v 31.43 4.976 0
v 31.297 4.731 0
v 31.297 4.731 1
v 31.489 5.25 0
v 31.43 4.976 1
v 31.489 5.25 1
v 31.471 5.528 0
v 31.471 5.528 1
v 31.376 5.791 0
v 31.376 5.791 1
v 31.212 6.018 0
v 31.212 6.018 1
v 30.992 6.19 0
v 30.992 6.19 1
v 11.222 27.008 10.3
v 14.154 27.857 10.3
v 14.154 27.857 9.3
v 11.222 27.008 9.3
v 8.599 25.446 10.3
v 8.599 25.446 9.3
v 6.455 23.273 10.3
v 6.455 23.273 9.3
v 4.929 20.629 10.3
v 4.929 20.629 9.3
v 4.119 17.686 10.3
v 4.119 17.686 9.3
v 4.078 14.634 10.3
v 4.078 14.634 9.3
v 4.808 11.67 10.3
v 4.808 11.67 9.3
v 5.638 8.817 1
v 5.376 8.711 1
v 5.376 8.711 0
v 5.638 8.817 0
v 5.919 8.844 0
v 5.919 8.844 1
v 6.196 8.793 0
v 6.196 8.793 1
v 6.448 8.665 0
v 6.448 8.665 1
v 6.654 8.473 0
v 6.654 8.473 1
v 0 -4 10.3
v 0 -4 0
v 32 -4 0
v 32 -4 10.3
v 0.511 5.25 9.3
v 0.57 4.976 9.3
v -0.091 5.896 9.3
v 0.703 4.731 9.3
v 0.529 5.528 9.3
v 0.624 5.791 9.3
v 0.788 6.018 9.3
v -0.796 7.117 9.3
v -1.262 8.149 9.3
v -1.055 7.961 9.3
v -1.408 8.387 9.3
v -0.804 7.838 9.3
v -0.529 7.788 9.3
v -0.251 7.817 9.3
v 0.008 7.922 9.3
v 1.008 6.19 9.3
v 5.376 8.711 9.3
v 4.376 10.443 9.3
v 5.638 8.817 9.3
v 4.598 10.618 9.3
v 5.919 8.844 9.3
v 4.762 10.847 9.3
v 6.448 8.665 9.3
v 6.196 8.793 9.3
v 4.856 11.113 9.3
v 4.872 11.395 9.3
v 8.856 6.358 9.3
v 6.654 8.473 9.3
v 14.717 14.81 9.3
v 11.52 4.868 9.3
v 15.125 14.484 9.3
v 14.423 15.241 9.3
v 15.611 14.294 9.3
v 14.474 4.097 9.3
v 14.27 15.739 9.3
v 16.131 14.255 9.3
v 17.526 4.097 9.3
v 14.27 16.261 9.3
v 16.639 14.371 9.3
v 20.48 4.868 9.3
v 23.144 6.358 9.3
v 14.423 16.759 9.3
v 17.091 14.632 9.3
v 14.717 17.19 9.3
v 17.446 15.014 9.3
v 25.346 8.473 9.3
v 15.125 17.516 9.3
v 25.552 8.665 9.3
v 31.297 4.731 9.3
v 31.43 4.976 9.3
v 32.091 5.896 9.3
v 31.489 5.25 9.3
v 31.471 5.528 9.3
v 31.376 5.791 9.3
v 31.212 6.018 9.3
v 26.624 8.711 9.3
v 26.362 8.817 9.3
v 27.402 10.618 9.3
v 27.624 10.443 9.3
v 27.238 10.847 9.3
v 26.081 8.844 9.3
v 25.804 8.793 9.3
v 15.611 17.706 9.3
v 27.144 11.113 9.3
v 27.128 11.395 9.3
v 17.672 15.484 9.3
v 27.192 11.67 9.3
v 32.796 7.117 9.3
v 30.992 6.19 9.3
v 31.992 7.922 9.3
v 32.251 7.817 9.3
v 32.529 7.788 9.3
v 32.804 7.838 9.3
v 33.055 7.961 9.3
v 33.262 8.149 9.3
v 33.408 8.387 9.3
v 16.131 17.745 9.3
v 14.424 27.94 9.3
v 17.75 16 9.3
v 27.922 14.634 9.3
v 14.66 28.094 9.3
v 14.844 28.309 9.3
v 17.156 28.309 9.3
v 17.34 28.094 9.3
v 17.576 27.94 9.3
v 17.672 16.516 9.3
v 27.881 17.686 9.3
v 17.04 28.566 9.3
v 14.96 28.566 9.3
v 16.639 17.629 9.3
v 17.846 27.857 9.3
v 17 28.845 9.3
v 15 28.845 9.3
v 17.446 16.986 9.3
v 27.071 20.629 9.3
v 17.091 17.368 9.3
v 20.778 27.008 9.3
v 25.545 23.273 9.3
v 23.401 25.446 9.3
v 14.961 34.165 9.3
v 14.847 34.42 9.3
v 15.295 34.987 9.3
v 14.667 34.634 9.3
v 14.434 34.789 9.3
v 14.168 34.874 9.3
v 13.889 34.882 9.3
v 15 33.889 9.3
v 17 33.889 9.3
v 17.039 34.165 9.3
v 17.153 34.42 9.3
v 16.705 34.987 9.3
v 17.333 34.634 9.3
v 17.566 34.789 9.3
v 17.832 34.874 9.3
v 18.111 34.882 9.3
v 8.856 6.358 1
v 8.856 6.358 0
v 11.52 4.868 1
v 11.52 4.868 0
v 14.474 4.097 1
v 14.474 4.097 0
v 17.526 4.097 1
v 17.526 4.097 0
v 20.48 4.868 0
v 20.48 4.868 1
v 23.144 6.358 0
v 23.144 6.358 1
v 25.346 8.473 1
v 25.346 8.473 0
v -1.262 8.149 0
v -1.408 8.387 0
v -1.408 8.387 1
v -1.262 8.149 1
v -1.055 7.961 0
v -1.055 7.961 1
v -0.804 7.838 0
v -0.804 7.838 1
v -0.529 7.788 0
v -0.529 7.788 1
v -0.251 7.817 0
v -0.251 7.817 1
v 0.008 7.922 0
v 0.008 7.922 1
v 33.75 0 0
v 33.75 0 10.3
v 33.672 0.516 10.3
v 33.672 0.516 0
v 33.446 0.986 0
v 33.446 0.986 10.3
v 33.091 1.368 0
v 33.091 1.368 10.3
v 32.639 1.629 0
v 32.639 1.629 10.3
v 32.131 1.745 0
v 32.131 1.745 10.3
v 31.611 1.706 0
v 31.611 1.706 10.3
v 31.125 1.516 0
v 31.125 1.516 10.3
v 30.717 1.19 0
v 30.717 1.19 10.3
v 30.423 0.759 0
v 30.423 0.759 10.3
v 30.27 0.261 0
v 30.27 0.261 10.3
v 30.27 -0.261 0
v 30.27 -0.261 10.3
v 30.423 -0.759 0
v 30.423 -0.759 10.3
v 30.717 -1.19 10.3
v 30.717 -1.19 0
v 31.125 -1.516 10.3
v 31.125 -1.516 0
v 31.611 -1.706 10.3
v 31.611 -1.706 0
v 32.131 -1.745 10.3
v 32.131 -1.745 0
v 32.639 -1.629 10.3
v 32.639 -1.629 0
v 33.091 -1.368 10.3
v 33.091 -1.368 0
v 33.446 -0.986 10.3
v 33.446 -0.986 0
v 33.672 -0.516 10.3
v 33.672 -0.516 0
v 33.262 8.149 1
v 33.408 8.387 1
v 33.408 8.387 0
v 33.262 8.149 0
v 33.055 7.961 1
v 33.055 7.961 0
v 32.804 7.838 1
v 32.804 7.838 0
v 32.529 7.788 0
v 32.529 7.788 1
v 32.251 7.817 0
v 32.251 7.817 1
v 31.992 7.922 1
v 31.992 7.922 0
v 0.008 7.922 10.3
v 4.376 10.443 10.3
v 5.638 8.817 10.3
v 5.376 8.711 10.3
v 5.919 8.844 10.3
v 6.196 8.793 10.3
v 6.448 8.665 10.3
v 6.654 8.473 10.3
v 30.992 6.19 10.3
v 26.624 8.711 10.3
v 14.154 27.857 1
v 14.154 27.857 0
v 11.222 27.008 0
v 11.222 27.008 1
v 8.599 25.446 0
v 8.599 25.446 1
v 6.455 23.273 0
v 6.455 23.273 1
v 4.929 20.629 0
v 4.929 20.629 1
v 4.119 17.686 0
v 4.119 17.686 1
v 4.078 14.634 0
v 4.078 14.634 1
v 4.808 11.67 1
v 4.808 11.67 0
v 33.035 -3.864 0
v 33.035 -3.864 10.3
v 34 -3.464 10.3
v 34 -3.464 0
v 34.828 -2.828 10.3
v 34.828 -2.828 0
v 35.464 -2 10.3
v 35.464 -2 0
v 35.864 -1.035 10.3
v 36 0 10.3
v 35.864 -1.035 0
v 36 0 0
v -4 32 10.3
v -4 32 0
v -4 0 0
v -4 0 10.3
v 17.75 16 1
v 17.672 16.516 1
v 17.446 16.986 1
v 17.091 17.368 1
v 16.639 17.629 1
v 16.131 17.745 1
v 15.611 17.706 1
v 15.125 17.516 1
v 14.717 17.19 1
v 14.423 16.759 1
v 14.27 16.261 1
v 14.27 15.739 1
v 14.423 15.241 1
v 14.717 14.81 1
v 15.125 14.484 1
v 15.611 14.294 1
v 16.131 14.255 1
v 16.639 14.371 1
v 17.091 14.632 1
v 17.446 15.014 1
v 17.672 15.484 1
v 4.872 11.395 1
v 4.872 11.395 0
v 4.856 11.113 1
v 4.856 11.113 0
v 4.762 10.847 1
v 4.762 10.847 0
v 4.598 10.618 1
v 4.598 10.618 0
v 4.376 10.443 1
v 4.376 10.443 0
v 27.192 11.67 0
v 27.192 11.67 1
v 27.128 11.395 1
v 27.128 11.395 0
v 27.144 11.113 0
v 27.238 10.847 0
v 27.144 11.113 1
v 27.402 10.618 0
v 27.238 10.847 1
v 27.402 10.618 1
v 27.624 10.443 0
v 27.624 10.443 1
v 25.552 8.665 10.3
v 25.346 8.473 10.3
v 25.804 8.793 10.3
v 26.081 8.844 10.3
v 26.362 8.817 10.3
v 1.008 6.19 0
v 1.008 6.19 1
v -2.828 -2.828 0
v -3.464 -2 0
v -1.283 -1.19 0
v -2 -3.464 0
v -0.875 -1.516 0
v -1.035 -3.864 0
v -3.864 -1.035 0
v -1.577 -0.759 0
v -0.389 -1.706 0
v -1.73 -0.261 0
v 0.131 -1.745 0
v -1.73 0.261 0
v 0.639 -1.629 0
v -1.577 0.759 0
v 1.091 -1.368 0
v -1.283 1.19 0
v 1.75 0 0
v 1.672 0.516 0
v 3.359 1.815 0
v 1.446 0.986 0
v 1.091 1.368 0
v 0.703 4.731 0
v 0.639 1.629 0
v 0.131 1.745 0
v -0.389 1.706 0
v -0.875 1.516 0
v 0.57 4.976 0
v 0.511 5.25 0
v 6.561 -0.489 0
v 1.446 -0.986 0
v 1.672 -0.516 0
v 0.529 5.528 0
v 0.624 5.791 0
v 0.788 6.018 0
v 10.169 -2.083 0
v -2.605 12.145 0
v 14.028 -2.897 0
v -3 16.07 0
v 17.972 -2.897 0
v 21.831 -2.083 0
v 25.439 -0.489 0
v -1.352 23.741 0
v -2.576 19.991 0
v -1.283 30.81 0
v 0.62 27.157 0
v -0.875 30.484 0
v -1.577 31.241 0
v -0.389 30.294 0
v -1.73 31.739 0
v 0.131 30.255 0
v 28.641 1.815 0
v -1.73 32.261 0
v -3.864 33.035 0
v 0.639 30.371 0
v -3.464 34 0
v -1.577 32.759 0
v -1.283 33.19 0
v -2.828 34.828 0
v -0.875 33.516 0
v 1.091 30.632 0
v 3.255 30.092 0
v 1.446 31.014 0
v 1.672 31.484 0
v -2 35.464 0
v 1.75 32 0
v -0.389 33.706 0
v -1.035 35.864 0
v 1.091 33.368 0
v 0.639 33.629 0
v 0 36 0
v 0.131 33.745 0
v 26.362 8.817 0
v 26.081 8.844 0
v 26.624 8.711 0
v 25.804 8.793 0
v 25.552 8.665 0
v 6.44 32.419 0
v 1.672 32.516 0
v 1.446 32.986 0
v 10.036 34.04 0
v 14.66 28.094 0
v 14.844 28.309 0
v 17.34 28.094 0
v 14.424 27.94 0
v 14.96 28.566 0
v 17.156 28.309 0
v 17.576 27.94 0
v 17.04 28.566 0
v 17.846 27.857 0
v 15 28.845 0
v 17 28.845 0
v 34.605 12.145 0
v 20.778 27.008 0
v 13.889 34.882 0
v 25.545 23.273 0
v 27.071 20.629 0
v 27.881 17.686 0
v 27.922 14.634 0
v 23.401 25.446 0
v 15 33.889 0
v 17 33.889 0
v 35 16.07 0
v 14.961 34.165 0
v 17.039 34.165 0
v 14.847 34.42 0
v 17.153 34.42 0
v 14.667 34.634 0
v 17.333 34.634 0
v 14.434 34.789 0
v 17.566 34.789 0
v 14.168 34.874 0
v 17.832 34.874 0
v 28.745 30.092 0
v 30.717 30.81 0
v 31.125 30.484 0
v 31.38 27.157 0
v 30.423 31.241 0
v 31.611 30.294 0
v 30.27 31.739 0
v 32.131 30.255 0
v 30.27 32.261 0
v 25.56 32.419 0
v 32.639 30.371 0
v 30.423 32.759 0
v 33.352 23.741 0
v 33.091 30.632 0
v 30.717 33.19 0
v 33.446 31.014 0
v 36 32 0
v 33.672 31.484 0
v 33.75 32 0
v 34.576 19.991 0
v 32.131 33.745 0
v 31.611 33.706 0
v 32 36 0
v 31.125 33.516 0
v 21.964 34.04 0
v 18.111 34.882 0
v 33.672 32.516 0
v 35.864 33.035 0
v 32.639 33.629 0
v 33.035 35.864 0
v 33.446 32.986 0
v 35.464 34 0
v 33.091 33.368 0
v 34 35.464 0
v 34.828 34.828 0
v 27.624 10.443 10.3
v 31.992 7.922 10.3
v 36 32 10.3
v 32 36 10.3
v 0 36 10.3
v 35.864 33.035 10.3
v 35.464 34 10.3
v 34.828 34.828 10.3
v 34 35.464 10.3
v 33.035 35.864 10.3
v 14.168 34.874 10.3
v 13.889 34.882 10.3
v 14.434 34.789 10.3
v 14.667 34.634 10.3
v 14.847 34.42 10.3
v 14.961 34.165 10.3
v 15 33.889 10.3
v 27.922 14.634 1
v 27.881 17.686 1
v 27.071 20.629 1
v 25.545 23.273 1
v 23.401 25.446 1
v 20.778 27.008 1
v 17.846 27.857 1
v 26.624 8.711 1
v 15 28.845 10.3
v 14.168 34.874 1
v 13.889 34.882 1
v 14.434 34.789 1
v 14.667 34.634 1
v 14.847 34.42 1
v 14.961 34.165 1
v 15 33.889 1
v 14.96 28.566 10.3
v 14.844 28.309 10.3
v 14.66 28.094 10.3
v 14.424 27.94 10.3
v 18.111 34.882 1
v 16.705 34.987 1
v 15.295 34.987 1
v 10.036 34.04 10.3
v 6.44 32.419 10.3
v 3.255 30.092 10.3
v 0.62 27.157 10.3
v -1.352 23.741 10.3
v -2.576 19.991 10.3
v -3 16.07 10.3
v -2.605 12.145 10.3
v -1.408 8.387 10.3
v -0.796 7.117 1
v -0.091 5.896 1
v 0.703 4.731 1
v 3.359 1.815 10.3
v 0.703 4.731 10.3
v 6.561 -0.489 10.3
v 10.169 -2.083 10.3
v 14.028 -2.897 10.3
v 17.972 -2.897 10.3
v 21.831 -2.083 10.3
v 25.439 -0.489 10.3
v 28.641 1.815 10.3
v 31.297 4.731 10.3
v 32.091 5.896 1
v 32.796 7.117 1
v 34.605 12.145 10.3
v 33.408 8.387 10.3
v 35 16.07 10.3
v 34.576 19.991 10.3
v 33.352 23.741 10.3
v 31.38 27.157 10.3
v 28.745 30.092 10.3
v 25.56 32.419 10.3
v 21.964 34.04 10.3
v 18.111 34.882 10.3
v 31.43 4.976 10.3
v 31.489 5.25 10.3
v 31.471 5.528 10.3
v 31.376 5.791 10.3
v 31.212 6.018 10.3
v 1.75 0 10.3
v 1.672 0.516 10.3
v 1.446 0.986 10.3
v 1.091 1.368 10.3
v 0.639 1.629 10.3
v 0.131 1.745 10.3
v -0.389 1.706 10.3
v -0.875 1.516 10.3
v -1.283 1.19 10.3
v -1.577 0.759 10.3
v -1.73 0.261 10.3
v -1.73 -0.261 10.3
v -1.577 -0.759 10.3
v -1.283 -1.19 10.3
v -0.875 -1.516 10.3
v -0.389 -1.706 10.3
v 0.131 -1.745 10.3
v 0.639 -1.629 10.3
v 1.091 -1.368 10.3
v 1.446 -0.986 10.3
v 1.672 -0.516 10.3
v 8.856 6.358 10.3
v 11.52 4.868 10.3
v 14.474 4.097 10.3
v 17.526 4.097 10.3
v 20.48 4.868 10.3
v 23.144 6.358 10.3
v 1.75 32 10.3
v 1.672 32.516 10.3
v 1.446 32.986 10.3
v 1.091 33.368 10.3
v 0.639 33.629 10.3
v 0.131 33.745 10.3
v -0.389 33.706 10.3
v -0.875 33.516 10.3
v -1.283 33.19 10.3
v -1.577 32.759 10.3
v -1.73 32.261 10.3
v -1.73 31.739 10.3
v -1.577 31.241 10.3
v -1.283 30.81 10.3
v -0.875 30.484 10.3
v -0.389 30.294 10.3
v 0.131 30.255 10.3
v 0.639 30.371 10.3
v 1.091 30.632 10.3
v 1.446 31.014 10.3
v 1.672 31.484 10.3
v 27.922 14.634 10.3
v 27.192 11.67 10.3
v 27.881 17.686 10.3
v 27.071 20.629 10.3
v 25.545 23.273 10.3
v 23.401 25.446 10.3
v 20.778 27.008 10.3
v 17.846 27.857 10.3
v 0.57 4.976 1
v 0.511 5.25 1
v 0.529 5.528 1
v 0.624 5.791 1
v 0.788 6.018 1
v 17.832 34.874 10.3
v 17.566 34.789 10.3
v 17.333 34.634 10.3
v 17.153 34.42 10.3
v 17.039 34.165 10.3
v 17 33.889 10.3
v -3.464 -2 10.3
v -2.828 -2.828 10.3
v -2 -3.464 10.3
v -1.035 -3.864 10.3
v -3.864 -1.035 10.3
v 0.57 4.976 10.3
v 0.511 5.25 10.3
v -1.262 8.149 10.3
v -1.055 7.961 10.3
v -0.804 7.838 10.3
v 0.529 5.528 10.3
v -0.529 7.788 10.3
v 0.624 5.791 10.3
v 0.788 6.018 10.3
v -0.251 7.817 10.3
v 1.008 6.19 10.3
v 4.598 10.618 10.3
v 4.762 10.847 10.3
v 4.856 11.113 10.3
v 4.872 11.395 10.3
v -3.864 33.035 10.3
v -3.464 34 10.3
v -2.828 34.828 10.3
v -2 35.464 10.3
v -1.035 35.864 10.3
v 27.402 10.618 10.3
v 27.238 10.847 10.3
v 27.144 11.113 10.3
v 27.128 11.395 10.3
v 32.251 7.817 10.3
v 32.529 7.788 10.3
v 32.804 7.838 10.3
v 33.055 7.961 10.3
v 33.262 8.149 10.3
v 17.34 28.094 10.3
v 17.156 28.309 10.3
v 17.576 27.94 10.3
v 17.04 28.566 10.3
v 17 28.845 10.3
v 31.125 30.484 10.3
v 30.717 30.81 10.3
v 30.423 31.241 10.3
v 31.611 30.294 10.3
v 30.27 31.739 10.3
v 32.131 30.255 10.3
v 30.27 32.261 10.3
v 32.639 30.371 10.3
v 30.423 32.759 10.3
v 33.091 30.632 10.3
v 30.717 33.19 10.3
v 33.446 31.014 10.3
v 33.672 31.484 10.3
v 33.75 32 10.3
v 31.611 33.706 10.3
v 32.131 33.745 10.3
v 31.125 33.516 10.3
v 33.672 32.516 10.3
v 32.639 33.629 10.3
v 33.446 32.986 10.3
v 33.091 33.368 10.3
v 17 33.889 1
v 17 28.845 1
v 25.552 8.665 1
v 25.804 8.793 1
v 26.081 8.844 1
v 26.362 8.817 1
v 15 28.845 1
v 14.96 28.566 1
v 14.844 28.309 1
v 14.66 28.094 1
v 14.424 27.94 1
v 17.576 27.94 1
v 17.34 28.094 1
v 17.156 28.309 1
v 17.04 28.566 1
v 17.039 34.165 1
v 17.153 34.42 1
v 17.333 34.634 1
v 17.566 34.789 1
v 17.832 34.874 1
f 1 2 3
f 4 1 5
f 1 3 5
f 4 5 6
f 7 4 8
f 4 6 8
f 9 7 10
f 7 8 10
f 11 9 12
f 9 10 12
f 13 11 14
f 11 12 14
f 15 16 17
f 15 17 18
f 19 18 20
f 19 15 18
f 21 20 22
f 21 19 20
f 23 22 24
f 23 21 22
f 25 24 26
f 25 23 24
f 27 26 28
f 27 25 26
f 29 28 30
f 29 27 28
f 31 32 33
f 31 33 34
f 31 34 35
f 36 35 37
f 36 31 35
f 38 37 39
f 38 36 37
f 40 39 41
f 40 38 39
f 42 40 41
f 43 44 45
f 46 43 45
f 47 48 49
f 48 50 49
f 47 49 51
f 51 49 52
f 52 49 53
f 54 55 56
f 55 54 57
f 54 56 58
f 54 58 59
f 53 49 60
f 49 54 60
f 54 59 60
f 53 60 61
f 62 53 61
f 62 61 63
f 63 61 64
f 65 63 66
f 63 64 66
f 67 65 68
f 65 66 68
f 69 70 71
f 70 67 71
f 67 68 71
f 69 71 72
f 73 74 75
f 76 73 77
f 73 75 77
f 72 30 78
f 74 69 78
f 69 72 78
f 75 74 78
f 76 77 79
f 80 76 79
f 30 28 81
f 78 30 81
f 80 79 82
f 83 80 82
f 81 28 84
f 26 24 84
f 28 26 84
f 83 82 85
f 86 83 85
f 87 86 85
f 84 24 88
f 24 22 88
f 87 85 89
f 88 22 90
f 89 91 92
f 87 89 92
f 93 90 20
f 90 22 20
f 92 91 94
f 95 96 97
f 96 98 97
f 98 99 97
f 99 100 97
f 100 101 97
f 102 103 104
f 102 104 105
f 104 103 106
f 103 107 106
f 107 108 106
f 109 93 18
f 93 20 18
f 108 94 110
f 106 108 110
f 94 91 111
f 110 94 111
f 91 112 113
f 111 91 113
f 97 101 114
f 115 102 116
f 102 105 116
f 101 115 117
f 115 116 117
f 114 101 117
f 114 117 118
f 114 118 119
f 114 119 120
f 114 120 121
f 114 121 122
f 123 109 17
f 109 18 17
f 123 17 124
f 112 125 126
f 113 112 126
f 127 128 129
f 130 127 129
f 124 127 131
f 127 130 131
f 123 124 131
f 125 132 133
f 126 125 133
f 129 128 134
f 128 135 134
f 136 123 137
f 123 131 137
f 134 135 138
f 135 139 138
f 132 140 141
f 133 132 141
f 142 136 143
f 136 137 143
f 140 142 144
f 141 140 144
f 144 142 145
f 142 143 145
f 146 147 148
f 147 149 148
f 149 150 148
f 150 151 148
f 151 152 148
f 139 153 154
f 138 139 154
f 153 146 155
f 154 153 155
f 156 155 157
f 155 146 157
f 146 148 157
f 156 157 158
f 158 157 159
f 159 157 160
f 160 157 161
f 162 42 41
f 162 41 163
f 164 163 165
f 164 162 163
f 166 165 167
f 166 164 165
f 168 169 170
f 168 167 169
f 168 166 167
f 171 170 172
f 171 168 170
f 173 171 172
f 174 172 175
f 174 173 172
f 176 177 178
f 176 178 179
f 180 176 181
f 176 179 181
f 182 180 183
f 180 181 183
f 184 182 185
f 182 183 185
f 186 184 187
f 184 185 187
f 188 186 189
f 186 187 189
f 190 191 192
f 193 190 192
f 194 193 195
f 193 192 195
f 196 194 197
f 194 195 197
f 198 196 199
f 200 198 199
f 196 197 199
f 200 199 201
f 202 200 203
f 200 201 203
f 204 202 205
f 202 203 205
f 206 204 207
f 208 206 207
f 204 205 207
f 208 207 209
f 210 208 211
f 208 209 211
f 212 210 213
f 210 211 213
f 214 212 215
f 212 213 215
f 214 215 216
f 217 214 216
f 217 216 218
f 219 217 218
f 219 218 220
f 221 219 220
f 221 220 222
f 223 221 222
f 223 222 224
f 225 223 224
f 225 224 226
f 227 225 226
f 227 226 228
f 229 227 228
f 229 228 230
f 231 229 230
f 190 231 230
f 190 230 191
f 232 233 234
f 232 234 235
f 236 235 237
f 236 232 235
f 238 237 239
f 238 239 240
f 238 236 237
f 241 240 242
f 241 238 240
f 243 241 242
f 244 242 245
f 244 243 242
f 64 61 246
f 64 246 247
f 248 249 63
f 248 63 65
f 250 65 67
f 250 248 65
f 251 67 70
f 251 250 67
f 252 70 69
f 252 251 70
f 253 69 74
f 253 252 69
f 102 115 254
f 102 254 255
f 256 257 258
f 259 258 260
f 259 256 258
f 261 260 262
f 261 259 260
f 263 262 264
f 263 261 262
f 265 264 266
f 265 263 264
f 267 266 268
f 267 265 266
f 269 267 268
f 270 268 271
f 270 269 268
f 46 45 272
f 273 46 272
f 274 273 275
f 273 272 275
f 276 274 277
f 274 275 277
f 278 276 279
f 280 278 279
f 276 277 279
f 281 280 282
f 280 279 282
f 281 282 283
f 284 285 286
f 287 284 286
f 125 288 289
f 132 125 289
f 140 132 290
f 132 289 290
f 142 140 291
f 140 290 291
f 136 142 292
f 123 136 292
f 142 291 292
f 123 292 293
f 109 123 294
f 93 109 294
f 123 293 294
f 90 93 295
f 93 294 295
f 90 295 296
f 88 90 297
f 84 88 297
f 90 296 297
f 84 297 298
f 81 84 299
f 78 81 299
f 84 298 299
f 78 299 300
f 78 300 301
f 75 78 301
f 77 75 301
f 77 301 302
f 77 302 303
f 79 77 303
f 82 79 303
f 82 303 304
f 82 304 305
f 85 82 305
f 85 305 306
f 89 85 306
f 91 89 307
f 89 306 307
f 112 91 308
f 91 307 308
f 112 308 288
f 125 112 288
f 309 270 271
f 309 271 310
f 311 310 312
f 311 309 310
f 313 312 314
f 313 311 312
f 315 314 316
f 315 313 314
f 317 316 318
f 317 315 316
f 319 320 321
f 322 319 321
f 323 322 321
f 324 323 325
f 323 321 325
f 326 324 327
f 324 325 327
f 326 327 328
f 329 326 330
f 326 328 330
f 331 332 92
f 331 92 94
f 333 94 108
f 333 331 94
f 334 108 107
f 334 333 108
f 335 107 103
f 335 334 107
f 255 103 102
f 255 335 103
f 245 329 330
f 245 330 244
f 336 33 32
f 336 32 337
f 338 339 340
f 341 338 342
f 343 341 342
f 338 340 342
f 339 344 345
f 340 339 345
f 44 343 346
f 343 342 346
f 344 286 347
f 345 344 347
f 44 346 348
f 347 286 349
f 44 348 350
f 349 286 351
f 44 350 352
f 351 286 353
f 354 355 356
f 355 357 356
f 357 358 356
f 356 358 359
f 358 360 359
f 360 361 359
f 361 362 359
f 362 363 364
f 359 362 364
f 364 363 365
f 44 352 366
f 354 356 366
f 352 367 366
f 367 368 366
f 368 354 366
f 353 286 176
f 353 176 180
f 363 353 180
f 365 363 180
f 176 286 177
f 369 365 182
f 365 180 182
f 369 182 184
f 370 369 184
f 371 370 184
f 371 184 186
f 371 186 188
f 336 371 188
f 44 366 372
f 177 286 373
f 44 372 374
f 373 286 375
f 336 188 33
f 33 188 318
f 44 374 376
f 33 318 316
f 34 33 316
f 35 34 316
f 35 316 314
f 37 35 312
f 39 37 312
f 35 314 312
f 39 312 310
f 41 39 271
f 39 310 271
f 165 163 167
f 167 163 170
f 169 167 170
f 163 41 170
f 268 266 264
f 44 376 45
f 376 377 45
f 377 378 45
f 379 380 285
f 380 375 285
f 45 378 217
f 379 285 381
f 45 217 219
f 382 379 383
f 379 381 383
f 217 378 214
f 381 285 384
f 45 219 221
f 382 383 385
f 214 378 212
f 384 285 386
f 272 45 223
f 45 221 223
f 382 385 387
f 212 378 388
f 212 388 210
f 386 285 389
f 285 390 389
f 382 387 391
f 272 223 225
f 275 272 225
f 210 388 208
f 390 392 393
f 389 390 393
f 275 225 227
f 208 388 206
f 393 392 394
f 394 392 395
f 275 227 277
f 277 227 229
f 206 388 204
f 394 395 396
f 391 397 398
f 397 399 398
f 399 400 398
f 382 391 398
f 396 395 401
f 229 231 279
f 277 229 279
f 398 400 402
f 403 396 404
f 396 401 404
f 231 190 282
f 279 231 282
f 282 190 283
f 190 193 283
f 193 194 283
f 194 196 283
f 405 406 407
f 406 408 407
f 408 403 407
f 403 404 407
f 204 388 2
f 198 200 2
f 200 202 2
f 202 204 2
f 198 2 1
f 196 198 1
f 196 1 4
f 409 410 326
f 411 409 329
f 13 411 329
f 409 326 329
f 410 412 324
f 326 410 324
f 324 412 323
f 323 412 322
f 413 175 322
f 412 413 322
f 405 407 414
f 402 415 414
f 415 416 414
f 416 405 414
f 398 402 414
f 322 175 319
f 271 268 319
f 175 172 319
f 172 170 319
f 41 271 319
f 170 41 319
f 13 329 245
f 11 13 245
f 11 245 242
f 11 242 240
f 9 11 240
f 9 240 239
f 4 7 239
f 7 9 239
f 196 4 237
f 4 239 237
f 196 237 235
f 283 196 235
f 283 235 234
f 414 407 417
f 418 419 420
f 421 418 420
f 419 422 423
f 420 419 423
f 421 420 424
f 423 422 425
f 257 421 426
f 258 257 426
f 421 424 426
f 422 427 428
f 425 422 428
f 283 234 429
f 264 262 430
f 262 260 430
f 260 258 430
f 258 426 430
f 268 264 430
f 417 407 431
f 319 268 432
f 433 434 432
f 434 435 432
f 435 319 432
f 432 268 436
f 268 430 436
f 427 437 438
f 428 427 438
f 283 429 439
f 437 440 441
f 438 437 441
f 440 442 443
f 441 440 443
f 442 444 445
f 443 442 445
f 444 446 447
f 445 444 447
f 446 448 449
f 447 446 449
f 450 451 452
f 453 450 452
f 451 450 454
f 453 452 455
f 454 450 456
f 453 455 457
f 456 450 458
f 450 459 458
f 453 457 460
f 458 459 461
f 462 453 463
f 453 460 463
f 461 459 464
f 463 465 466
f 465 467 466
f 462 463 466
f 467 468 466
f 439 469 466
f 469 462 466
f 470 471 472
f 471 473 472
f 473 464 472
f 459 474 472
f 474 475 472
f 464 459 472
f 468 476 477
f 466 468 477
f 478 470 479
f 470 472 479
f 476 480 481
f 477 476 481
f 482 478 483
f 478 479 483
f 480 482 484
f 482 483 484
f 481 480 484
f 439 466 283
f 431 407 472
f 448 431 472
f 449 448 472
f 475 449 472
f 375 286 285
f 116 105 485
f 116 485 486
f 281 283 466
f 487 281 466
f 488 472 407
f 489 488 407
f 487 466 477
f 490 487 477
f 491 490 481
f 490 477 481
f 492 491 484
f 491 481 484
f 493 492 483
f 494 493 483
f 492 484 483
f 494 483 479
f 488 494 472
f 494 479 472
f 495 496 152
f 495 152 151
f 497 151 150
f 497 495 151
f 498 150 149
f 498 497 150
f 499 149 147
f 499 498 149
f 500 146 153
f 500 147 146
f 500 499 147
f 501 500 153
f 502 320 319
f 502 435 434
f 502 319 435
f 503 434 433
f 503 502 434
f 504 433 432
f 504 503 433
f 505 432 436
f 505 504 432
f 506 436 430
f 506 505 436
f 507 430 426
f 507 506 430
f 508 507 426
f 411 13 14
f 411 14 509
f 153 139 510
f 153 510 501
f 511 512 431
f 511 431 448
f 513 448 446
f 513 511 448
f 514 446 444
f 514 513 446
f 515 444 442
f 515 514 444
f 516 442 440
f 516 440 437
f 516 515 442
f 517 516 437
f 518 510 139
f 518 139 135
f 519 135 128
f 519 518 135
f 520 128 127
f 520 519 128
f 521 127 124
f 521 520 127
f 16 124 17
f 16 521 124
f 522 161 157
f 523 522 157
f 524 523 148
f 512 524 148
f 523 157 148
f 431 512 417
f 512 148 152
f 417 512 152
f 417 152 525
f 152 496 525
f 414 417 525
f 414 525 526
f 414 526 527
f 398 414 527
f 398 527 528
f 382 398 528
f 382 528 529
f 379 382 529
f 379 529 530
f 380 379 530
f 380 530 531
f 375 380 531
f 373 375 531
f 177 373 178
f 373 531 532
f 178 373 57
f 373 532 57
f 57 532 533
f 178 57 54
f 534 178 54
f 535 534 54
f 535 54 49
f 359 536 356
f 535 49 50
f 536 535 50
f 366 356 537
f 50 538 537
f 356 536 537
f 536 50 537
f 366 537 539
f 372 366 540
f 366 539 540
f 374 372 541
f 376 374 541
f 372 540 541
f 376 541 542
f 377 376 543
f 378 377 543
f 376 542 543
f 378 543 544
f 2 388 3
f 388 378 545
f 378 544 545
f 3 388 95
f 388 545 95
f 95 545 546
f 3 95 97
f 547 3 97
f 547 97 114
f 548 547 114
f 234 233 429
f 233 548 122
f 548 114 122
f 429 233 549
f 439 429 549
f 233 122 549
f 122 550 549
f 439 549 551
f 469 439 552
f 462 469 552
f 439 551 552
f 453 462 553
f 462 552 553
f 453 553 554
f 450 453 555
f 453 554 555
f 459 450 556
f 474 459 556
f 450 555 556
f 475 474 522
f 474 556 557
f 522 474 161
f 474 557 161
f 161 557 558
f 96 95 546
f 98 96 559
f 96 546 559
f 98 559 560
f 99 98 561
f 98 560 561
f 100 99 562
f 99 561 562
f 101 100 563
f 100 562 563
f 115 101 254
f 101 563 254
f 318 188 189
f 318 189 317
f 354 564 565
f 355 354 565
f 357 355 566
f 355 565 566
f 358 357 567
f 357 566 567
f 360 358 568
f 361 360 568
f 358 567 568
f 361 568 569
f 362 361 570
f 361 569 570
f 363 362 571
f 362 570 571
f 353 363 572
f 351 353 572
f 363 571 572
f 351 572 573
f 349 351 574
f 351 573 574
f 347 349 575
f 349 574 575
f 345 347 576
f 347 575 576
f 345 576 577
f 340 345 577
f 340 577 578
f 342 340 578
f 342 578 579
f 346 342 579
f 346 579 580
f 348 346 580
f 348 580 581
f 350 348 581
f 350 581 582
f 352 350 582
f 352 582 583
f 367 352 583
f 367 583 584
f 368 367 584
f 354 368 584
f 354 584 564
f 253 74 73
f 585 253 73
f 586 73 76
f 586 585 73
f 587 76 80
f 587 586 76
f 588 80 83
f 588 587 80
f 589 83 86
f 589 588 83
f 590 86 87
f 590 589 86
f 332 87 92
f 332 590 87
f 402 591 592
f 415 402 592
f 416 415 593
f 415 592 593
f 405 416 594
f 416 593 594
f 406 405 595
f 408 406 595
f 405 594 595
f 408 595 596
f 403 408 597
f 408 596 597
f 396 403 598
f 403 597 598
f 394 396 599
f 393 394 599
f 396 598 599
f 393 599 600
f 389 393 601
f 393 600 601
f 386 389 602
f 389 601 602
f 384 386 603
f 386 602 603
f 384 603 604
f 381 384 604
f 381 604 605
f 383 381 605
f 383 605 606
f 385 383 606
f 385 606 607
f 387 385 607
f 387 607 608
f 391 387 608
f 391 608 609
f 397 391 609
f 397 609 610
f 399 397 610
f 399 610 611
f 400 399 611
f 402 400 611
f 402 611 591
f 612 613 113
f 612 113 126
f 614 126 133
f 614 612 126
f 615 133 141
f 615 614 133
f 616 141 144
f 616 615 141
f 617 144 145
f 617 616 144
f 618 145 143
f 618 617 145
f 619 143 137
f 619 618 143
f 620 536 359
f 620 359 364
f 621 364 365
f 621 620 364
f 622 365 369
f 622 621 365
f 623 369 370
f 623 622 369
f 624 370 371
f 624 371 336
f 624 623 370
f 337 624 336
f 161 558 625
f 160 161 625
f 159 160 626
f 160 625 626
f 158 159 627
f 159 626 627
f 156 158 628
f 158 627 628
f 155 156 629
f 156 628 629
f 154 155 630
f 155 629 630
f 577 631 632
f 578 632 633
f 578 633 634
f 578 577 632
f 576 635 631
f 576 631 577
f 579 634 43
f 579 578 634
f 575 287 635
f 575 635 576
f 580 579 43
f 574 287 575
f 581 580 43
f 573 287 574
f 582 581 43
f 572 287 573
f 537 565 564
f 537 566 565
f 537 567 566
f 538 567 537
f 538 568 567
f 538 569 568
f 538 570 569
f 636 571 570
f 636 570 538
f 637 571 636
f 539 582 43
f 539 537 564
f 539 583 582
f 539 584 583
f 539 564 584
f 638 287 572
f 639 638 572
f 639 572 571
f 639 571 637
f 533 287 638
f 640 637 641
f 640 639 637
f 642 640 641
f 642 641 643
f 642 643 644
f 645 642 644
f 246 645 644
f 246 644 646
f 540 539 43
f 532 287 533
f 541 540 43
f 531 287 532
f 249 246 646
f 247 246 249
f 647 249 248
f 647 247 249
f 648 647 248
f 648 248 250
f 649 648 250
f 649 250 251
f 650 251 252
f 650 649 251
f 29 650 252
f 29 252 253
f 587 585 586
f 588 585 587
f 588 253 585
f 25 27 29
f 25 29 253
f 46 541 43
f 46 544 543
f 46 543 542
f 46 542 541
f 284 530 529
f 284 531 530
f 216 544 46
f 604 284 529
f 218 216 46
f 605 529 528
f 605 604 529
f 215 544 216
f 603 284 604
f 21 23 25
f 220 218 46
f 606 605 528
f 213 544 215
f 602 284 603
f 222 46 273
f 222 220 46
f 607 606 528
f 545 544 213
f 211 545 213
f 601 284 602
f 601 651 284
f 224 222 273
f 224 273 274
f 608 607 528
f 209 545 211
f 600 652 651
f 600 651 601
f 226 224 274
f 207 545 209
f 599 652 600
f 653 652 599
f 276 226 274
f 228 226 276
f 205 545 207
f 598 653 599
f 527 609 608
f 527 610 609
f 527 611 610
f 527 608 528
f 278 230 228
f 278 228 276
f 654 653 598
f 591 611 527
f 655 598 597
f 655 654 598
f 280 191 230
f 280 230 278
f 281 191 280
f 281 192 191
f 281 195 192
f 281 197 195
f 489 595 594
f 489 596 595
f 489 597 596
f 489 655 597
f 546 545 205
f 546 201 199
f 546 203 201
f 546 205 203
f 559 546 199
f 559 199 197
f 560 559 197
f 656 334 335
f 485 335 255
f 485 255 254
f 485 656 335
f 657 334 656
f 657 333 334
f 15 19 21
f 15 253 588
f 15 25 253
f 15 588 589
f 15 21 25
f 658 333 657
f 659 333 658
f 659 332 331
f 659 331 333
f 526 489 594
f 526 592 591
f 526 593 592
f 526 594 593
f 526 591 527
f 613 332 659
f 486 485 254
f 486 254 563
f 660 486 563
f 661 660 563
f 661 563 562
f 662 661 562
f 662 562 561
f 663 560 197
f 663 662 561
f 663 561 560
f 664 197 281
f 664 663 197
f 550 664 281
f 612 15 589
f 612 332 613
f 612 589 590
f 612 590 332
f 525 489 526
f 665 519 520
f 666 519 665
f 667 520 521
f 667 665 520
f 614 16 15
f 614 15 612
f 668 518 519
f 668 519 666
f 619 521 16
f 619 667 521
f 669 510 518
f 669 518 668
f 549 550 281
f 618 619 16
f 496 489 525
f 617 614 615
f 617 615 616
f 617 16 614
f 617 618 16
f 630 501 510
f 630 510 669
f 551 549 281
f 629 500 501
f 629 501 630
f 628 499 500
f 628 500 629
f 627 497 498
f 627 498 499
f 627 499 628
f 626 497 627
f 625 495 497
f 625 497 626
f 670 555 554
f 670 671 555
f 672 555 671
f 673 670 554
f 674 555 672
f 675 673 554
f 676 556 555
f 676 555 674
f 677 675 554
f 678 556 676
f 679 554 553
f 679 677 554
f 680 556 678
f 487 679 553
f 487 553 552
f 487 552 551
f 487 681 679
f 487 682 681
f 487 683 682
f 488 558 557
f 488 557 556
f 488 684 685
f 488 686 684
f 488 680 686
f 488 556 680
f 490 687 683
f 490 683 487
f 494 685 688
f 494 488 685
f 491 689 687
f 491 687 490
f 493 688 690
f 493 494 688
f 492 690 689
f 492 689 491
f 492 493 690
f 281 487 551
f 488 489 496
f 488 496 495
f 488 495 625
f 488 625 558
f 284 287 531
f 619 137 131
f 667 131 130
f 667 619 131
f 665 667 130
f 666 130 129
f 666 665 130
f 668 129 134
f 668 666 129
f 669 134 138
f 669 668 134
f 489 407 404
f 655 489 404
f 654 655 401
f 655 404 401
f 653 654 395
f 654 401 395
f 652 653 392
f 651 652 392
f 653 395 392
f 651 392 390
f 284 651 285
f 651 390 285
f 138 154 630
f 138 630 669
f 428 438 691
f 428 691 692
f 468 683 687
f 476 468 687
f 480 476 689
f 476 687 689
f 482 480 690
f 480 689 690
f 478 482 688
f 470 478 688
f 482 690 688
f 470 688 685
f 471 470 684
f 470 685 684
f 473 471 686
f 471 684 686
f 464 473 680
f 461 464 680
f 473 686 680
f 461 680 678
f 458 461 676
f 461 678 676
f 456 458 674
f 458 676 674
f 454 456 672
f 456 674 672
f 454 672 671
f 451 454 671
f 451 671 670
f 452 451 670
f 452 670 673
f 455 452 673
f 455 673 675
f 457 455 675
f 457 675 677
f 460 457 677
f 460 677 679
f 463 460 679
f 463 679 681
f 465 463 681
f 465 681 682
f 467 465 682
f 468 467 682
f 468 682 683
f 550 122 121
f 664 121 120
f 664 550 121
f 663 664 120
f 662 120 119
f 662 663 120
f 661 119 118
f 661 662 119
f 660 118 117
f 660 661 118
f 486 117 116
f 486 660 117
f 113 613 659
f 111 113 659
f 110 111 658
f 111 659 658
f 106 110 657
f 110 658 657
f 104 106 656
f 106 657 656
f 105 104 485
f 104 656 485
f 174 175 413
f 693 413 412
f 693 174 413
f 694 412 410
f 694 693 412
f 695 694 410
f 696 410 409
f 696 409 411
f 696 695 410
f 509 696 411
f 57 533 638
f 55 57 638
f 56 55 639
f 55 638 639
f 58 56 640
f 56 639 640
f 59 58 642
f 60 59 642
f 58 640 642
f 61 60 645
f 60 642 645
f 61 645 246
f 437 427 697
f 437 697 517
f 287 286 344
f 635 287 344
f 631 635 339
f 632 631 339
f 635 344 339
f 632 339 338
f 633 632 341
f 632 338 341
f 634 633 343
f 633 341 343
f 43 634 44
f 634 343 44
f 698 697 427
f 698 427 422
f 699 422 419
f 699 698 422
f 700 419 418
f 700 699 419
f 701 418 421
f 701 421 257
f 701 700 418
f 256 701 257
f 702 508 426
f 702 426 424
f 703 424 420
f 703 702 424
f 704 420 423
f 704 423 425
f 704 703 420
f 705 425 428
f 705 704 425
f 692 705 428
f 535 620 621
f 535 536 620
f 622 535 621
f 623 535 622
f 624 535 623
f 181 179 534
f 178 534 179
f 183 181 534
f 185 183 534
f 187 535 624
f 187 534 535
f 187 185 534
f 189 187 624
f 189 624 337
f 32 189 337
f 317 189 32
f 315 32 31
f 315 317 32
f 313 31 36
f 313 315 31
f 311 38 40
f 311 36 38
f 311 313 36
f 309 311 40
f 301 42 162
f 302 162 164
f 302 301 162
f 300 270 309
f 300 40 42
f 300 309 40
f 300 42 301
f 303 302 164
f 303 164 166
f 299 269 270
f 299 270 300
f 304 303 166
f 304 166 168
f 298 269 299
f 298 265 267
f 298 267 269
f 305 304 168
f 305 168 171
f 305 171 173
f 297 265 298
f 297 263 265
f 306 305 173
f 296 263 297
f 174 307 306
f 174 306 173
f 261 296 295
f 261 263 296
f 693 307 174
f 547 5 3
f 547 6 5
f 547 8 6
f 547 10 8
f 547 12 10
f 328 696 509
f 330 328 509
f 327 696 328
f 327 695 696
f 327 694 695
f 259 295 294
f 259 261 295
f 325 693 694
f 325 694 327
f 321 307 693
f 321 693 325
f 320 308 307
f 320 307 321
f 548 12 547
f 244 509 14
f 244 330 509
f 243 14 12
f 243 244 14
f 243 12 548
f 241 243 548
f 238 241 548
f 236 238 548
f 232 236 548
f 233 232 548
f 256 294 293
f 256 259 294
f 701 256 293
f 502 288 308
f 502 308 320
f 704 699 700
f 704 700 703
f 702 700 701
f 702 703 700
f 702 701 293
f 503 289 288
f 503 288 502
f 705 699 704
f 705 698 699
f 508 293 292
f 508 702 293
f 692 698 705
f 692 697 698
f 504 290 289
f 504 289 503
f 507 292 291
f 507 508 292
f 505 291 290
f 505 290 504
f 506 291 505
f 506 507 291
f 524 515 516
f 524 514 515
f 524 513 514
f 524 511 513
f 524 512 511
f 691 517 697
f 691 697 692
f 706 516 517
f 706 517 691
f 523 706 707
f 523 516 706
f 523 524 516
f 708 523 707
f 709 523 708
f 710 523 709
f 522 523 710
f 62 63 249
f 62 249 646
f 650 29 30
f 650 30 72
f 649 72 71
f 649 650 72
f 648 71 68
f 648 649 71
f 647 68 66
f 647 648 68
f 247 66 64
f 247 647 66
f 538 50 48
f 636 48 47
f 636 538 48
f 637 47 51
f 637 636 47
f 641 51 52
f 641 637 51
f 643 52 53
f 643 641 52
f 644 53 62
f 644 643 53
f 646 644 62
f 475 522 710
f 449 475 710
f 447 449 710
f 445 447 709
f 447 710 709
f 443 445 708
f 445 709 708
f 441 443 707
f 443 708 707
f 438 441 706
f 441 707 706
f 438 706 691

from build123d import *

# Parameters (mm, degrees)
BOSS_EXTRUDE1_DEPTH = 10.3
SKETCH2_R           = 1.75
CUT_EXTRUDE1_DEPTH  = 11.3
SKETCH3_R           = 19
SKETCH3_R_2         = 12
CUT_EXTRUDE2_DEPTH  = 11.3
BOSS_EXTRUDE2_DEPTH = 10.3
CIRPATTERN1_COUNT   = 3
FILLET2_R           = 1
CUT_EXTRUDE3_START  = 1
SKETCH5_R           = 19
CUT_EXTRUDE3_DEPTH  = 8.3
SKETCH6_R           = 1.75
BOSS_EXTRUDE3_DEPTH = 8.3


with BuildPart() as part:
    # Sketch1 → Boss-Extrude1 (new body)
    with BuildSketch(Plane.XY):
        with BuildLine():
            Line((0, -4), (32, -4))
            ThreePointArc((32, -4), (34.828427125, -2.828427125), (36, 0))
            Line((36, 0), (36, 32))
            ThreePointArc((36, 32), (34.828427125, 34.828427125), (32, 36))
            Line((32, 36), (0, 36))
            ThreePointArc((0, 36), (-2.828427125, 34.828427125), (-4, 32))
            Line((-4, 32), (-4, 0))
            ThreePointArc((-4, 0), (-2.828427125, -2.828427125), (0, -4))
        make_face()
    extrude(amount=BOSS_EXTRUDE1_DEPTH)

    # Sketch2 → Cut-Extrude1 (cut, through all)
    with BuildSketch(Plane.XY.offset(10.3)):
        Circle(SKETCH2_R)
        with Locations((0, 32)):
            Circle(SKETCH2_R)
        with Locations((32, 0)):
            Circle(SKETCH2_R)
        with Locations((32, 32)):
            Circle(SKETCH2_R)
    extrude(amount=-CUT_EXTRUDE1_DEPTH, mode=Mode.SUBTRACT)

    # Sketch3 → Cut-Extrude2 (cut, through all)
    with BuildSketch(Plane.XY.offset(10.3)):
        with Locations((16, 16)):
            Circle(SKETCH3_R)
        with Locations((16, 16)):
            Circle(SKETCH3_R_2, mode=Mode.SUBTRACT)
    extrude(amount=-CUT_EXTRUDE2_DEPTH, mode=Mode.SUBTRACT)

    # Sketch4 → Boss-Extrude2 (add)
    with BuildSketch(Plane.XY):
        with BuildLine():
            Line((15, 27.958260743), (15, 34.973665961))
            ThreePointArc((15, 34.973665961), (16, 35), (17, 34.973665961))
            Line((17, 34.973665961), (17, 27.958260743))
            ThreePointArc((17, 27.958260743), (16, 28), (15, 27.958260743))
        make_face()
    boss_extrude2 = extrude(amount=BOSS_EXTRUDE2_DEPTH)

    # CirPattern1: Boss-Extrude2 ×3 about axis
    cirpattern1_axis = Axis((16, 16, 0), (0, 0, 1))
    for i in range(1, CIRPATTERN1_COUNT):
        add(boss_extrude2.rotate(cirpattern1_axis, i * 360 / CIRPATTERN1_COUNT))

    # Fillet2
    fillet2_edges = [part.edges().sort_by_distance(p)[0] for p in [
        (15, 27.958260743, 5.15),
        (17, 27.958260743, 5.15),
        (17, 34.973665961, 5.15),
        (15, 34.973665961, 5.15),
        (6.143842411, 9.154844225, 5.15),
        (5.143842411, 10.886895032, 5.15),
        (-0.931676725, 7.379192423, 5.15),
        (0.068323275, 5.647141616, 5.15),
        (26.856157589, 10.886895032, 5.15),
        (25.856157589, 9.154844225, 5.15),
        (31.931676725, 5.647141616, 5.15),
        (32.931676725, 7.379192423, 5.15),
    ]]
    fillet(fillet2_edges, radius=FILLET2_R)

    # Sketch5 → Cut-Extrude3 (cut)
    with BuildSketch(Plane.XY.offset(CUT_EXTRUDE3_START)):
        with Locations((16, 16)):
            Circle(SKETCH5_R)
    extrude(amount=CUT_EXTRUDE3_DEPTH, mode=Mode.SUBTRACT)

    # Sketch6 → Boss-Extrude3 (add)
    with BuildSketch(Plane.XY.offset(1)):
        with Locations((16, 16)):
            Circle(SKETCH6_R)
    extrude(amount=BOSS_EXTRUDE3_DEPTH)


solid = part.part
